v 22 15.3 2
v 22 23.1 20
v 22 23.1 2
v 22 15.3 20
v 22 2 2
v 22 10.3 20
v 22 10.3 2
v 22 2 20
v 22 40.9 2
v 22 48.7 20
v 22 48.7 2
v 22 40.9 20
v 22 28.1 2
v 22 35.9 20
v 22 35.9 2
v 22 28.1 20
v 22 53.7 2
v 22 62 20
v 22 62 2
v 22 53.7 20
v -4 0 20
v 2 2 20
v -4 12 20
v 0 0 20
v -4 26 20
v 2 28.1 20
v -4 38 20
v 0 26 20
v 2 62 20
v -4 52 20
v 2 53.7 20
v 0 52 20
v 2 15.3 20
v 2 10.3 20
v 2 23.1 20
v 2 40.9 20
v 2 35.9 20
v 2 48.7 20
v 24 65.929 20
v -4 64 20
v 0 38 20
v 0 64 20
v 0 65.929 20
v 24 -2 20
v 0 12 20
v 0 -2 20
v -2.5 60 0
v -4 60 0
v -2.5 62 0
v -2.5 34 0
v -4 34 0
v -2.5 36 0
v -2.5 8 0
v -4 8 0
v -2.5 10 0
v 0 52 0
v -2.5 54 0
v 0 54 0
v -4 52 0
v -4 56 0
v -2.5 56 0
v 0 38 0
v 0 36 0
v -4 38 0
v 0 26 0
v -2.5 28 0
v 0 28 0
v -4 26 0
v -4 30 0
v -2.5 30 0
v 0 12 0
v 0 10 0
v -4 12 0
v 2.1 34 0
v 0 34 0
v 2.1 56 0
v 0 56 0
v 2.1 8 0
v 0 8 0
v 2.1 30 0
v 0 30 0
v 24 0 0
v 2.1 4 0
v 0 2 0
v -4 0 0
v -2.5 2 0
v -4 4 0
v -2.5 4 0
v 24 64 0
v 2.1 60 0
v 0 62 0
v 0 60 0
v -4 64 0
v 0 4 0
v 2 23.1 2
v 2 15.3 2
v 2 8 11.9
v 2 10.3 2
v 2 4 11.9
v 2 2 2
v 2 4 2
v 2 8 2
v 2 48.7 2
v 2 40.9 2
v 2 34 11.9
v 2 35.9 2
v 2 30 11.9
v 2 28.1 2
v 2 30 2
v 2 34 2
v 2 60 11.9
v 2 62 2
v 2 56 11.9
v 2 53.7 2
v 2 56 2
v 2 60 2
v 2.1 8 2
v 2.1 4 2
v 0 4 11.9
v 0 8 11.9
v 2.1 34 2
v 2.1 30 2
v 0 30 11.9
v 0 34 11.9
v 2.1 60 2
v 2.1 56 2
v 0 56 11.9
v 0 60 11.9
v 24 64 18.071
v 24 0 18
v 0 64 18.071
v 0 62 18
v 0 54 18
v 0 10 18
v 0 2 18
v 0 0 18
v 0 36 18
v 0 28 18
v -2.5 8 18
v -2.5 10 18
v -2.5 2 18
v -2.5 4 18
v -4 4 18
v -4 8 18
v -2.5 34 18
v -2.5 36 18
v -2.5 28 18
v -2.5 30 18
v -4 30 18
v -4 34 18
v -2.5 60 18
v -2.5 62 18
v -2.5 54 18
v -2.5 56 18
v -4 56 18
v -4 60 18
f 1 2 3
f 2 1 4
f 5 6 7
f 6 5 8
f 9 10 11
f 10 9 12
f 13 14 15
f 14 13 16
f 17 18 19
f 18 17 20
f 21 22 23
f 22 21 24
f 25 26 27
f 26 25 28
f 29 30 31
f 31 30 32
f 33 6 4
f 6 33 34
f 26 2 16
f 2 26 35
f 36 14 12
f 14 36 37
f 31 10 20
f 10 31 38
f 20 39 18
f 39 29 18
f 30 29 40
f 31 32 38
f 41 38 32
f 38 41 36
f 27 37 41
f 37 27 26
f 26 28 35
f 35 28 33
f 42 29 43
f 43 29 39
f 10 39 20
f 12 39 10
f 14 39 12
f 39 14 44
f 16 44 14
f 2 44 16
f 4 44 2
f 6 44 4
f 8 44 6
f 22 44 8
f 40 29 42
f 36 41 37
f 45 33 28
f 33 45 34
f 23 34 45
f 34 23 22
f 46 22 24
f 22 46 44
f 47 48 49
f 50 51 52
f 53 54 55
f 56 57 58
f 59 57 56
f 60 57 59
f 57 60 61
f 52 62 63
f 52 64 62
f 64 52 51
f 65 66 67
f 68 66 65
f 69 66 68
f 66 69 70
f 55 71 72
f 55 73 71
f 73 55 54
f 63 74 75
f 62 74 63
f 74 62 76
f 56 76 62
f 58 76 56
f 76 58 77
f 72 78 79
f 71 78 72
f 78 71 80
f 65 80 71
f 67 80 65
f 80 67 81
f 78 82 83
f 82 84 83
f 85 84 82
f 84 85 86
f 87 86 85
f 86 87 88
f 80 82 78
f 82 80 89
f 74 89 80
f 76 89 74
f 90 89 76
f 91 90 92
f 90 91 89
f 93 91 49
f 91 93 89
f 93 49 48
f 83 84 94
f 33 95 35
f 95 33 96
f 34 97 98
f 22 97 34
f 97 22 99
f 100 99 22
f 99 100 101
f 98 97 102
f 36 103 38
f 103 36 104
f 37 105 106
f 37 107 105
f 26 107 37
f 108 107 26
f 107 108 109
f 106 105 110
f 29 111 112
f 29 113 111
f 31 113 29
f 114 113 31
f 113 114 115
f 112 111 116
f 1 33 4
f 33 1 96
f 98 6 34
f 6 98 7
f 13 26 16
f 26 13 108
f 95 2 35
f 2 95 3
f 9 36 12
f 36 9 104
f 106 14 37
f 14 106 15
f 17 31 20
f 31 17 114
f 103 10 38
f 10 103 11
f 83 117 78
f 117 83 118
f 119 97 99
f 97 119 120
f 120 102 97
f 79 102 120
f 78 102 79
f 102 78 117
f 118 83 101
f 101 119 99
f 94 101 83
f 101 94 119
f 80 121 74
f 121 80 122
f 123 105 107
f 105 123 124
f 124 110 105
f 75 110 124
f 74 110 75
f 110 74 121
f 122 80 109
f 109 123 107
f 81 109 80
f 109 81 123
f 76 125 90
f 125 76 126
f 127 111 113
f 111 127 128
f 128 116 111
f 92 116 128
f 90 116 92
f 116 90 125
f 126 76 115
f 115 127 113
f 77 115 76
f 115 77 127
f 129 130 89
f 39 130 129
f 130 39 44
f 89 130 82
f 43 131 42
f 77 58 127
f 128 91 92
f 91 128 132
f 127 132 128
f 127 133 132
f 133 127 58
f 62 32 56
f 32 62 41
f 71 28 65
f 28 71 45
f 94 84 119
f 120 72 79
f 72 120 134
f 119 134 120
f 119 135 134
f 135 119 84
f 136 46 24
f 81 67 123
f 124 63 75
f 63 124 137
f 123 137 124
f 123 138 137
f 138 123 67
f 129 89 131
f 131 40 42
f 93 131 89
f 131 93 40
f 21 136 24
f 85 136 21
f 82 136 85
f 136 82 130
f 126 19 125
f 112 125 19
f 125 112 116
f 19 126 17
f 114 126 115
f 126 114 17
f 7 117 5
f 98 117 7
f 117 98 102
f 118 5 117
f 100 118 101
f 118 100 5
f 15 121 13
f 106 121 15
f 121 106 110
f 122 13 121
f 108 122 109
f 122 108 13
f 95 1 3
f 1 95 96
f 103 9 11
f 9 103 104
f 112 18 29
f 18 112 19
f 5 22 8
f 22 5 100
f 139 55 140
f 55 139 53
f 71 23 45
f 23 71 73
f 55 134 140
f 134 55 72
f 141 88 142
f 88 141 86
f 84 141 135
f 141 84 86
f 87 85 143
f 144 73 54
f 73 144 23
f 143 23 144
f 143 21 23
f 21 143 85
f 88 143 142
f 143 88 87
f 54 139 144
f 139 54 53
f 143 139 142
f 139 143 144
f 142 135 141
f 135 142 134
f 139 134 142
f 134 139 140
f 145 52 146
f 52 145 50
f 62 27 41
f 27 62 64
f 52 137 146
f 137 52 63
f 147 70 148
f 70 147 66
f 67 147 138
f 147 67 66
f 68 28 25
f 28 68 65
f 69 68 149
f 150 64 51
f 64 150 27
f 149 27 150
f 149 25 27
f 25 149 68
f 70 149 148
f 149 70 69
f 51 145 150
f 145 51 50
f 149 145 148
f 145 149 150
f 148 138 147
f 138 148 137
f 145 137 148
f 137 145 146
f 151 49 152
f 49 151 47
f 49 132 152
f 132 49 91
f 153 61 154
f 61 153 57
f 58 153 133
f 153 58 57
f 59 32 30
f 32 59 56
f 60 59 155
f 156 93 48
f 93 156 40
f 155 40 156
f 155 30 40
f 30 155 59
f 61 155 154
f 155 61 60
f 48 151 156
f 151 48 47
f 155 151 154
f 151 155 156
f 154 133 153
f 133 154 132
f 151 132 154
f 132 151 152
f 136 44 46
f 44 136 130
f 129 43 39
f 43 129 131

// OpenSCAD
// (C) 2016 B. Visee, info@lichtsignaal.nl
// This is for making lightboxes in, mostly, h0-scale, houses
// No guarentees, but I like it!

// ===================================
// ** CHANGELOG
// ===================================

// v1   Added better spacing for holes
//      Added holestart parameter so you can align hole(s) from the sides
// v2   Started working on inner walls for bigger boxes, easier to glue
// v3   Add one print mount, have to do the multiple ones yet ;)
// v3.1 Added print-thickness option
// v4   Removed simple holes, the effect is just not realistic enough
//      Added inner wall option with autospacing
//      Added autospacing for print holders

// ===================================
// ** ToDo
// ===================================

// Suggestions welcome :)

// ===================================
// ** START USER PARAMETERS
// ===================================

// Basic sizes (inner sizes)
depth           = 20;
width           = 60;
height          = 20;
thick           = 2;            // Thickness of box walls, varies for printers
                                // Does not affect bottom btw! That is steady 2mm.
thicklimit      = 6;            // Limit for adding 45 degree glue supports                    

// Inner walls with automatic spacing
enablewalls     = 1;            // Inner walls (0 disable, 1 enable)
wallthick       = 5;            // Thickness of inner wall
numwalls        = 4;            // Number of walls

// Mount for print with automatic spacing
enableprint     = 1;            // Adds a slide-in mount for a print (0 disable, 1 enable)
printwidth      = 5;            // Print width. Wider print can be used to add more then 1 LED
numprints       = 3;            // Supports maximum of 3 sliders
printstart      = 0;            // Y-start position
printthick      = 2.5;          // Thickness of your print

// ===================================
// ** END USER PARAMETERS
// ===================================

// For good measure
outerdepth      = depth + (thick*2);     // X
outerwidth      = width + (thick*2);     // Y
outerheight     = height;                // Z
offsetprint     = (printwidth - numprints) - 0.5;
wallspace       = (outerwidth / (numwalls+1)) ;
printspacing    = ((outerwidth - ((numprints * printwidth)+(printstart * 2))) / (numprints-1)) + offsetprint;

// TESTING

// END TESTING

union()
{
    // Inner walls
    if(enablewalls)
    {
        for (n = [ 1 : (numwalls) ])
        {
            translate([thick,(n*wallspace)-(wallthick/2),0])
            {
                cube([depth,wallthick,outerheight]);
            }
        }
    }
    
    /*
    if(enablewalls && (numprints > 2))
    {
        for (n = [ 0 : (numprints-2) ])
        {
            translate([thick,(printstart+wallspace)+(n*wallspace),0])
            //translate([thick,(((width+(wallthick/2)-thick)/numprints))+(n*printspacing),0])
            {
                cube([depth,wallthick,outerheight]);
            }
        }
    }
    */
    
    difference()
    {
        // Base cube
        cube([outerdepth,outerwidth,outerheight]);

        translate([thick, thick, 2])
        {
            cube([depth,width,height]);
        }
        
        // Slider opening
        if(enableprint)
        {
            // Add center one for one print
            if(numprints == 1)
            {
                translate([0,(width/2)-((thick-0.5)+(printwidth/2)),0])
                {
                    difference()
                    {
                        translate([-0.5,4,-0.1])
                        {
                            cube([0.6+thick,printwidth-1,height-8]);
                        }
                    }
                }
            }
   
            if(numprints == 2)
            {
                for (n = [ 0 : (numprints-1) ])
                {
                    translate([0,(printstart/2)+(n*((outerwidth-(printstart+thick))-(printwidth*2))),0])
                    {
                        difference()
                        {
                            translate([-0.5,4,-0.1])
                            {
                                cube([0.6+thick,printwidth-1,height-8]);
                            }
                        }
                    }
                }
            }
            
            if(numprints > 2)
            {   
                for (n = [ 0 : (numprints-1) ])
                {
                    translate([0,printstart+(n*printspacing),0])
                    {
                        difference()
                        {
                            translate([-0.5,4,-0.1])
                            {
                                cube([0.6+thick,printwidth-1,height-8]);
                            }
                        }
                    }
                }
            }
        }        
    }
    
    // Print slider stuff
    if(enableprint)
    {
        // Add center one for one print
        if(numprints == 1)
        {
            translate([0,(width/2)-((thick-0.5)+(printwidth/2)),0])
            {
                union()
                {
                    // Sliding part
                    translate([-printthick,printwidth+5,0])
                    {
                        cube([printthick,2,height]);
                    }

                    translate([-printthick,0,0])
                    {
                        cube([printthick,2,height]);
                    }

                    translate([-(printthick+1.5),0,0])
                    {
                        cube([1.5,4,height]);
                    }

                    translate([-(printthick+1.5),printwidth+3,0])
                    {
                        cube([1.5,4,height]);
                    }
                    
                    translate([-(printthick+1.5),1.5,height-2])
                    {
                        cube([(printthick+1.5),printwidth+3.5,2]);
                    }
                }
            }
        }
        
        if(numprints == 2)
        {
            for (n = [ 0 : (numprints-1) ])
            {
                translate([0,(printstart/2)+(n*((outerwidth-(printstart+thick))-(printwidth*2))),0])
                {
                    union()
                    {
                        // Sliding part
                        translate([-printthick,printwidth+5,0])
                        {
                            cube([printthick,2,height]);
                        }

                        translate([-printthick,0,0])
                        {
                            cube([printthick,2,height]);
                        }

                        translate([-(printthick+1.5),0,0])
                        {
                            cube([1.5,4,height]);
                        }

                        translate([-(printthick+1.5),printwidth+3,0])
                        {
                            cube([1.5,4,height]);
                        }
                        
                        translate([-(printthick+1.5),1.5,height-2])
                        {
                            cube([(printthick+1.5),printwidth+3.5,2]);
                        }
                    }
                }
            }
        }
        
        if(numprints > 2)
        {
            for (n = [ 0 : (numprints-1) ])
            {
                translate([0,printstart+(n*printspacing),0])
                {
                    union()
                    {
                        // Sliding part
                        translate([-printthick,printwidth+5,0])
                        {
                            cube([printthick,2,height]);
                        }

                        translate([-printthick,0,0])
                        {
                            cube([printthick,2,height]);
                        }

                        translate([-(printthick+1.5),0,0])
                        {
                            cube([1.5,4,height]);
                        }

                        translate([-(printthick+1.5),printwidth+3,0])
                        {
                            cube([1.5,4,height]);
                        }
                        
                        translate([-(printthick+1.5),1.5,height-2])
                        {
                            cube([(printthick+1.5),printwidth+3.5,2]);
                        }
                    }
                }
            }
        }
    }
    
    // Glue edges for thin outerwalls (you probably want that at walls < 2mm thick)
    if(thick<thicklimit)
    {
        translate([0,0,-2])
        {
            difference()
            {
                translate([0,-2,height])
                {    
                    cube([outerdepth,2,2]);
                }

                translate([-1,1,height-1])
                {
                    rotate([135,0,0])
                    {
                        cube([outerdepth+2,5,5]);
                    }
                }
            }
        }
        
        translate([0,outerwidth+2,-2])
        {
            difference()
            {
                translate([0,-2,height])
                {    
                    cube([outerdepth,2,2]);
                }

                translate([-1,4,height-1])
                {
                    rotate([135,0,0])
                    {
                        cube([outerdepth+2,5,5]);
                    }
                }
            }
        }
    }
}
